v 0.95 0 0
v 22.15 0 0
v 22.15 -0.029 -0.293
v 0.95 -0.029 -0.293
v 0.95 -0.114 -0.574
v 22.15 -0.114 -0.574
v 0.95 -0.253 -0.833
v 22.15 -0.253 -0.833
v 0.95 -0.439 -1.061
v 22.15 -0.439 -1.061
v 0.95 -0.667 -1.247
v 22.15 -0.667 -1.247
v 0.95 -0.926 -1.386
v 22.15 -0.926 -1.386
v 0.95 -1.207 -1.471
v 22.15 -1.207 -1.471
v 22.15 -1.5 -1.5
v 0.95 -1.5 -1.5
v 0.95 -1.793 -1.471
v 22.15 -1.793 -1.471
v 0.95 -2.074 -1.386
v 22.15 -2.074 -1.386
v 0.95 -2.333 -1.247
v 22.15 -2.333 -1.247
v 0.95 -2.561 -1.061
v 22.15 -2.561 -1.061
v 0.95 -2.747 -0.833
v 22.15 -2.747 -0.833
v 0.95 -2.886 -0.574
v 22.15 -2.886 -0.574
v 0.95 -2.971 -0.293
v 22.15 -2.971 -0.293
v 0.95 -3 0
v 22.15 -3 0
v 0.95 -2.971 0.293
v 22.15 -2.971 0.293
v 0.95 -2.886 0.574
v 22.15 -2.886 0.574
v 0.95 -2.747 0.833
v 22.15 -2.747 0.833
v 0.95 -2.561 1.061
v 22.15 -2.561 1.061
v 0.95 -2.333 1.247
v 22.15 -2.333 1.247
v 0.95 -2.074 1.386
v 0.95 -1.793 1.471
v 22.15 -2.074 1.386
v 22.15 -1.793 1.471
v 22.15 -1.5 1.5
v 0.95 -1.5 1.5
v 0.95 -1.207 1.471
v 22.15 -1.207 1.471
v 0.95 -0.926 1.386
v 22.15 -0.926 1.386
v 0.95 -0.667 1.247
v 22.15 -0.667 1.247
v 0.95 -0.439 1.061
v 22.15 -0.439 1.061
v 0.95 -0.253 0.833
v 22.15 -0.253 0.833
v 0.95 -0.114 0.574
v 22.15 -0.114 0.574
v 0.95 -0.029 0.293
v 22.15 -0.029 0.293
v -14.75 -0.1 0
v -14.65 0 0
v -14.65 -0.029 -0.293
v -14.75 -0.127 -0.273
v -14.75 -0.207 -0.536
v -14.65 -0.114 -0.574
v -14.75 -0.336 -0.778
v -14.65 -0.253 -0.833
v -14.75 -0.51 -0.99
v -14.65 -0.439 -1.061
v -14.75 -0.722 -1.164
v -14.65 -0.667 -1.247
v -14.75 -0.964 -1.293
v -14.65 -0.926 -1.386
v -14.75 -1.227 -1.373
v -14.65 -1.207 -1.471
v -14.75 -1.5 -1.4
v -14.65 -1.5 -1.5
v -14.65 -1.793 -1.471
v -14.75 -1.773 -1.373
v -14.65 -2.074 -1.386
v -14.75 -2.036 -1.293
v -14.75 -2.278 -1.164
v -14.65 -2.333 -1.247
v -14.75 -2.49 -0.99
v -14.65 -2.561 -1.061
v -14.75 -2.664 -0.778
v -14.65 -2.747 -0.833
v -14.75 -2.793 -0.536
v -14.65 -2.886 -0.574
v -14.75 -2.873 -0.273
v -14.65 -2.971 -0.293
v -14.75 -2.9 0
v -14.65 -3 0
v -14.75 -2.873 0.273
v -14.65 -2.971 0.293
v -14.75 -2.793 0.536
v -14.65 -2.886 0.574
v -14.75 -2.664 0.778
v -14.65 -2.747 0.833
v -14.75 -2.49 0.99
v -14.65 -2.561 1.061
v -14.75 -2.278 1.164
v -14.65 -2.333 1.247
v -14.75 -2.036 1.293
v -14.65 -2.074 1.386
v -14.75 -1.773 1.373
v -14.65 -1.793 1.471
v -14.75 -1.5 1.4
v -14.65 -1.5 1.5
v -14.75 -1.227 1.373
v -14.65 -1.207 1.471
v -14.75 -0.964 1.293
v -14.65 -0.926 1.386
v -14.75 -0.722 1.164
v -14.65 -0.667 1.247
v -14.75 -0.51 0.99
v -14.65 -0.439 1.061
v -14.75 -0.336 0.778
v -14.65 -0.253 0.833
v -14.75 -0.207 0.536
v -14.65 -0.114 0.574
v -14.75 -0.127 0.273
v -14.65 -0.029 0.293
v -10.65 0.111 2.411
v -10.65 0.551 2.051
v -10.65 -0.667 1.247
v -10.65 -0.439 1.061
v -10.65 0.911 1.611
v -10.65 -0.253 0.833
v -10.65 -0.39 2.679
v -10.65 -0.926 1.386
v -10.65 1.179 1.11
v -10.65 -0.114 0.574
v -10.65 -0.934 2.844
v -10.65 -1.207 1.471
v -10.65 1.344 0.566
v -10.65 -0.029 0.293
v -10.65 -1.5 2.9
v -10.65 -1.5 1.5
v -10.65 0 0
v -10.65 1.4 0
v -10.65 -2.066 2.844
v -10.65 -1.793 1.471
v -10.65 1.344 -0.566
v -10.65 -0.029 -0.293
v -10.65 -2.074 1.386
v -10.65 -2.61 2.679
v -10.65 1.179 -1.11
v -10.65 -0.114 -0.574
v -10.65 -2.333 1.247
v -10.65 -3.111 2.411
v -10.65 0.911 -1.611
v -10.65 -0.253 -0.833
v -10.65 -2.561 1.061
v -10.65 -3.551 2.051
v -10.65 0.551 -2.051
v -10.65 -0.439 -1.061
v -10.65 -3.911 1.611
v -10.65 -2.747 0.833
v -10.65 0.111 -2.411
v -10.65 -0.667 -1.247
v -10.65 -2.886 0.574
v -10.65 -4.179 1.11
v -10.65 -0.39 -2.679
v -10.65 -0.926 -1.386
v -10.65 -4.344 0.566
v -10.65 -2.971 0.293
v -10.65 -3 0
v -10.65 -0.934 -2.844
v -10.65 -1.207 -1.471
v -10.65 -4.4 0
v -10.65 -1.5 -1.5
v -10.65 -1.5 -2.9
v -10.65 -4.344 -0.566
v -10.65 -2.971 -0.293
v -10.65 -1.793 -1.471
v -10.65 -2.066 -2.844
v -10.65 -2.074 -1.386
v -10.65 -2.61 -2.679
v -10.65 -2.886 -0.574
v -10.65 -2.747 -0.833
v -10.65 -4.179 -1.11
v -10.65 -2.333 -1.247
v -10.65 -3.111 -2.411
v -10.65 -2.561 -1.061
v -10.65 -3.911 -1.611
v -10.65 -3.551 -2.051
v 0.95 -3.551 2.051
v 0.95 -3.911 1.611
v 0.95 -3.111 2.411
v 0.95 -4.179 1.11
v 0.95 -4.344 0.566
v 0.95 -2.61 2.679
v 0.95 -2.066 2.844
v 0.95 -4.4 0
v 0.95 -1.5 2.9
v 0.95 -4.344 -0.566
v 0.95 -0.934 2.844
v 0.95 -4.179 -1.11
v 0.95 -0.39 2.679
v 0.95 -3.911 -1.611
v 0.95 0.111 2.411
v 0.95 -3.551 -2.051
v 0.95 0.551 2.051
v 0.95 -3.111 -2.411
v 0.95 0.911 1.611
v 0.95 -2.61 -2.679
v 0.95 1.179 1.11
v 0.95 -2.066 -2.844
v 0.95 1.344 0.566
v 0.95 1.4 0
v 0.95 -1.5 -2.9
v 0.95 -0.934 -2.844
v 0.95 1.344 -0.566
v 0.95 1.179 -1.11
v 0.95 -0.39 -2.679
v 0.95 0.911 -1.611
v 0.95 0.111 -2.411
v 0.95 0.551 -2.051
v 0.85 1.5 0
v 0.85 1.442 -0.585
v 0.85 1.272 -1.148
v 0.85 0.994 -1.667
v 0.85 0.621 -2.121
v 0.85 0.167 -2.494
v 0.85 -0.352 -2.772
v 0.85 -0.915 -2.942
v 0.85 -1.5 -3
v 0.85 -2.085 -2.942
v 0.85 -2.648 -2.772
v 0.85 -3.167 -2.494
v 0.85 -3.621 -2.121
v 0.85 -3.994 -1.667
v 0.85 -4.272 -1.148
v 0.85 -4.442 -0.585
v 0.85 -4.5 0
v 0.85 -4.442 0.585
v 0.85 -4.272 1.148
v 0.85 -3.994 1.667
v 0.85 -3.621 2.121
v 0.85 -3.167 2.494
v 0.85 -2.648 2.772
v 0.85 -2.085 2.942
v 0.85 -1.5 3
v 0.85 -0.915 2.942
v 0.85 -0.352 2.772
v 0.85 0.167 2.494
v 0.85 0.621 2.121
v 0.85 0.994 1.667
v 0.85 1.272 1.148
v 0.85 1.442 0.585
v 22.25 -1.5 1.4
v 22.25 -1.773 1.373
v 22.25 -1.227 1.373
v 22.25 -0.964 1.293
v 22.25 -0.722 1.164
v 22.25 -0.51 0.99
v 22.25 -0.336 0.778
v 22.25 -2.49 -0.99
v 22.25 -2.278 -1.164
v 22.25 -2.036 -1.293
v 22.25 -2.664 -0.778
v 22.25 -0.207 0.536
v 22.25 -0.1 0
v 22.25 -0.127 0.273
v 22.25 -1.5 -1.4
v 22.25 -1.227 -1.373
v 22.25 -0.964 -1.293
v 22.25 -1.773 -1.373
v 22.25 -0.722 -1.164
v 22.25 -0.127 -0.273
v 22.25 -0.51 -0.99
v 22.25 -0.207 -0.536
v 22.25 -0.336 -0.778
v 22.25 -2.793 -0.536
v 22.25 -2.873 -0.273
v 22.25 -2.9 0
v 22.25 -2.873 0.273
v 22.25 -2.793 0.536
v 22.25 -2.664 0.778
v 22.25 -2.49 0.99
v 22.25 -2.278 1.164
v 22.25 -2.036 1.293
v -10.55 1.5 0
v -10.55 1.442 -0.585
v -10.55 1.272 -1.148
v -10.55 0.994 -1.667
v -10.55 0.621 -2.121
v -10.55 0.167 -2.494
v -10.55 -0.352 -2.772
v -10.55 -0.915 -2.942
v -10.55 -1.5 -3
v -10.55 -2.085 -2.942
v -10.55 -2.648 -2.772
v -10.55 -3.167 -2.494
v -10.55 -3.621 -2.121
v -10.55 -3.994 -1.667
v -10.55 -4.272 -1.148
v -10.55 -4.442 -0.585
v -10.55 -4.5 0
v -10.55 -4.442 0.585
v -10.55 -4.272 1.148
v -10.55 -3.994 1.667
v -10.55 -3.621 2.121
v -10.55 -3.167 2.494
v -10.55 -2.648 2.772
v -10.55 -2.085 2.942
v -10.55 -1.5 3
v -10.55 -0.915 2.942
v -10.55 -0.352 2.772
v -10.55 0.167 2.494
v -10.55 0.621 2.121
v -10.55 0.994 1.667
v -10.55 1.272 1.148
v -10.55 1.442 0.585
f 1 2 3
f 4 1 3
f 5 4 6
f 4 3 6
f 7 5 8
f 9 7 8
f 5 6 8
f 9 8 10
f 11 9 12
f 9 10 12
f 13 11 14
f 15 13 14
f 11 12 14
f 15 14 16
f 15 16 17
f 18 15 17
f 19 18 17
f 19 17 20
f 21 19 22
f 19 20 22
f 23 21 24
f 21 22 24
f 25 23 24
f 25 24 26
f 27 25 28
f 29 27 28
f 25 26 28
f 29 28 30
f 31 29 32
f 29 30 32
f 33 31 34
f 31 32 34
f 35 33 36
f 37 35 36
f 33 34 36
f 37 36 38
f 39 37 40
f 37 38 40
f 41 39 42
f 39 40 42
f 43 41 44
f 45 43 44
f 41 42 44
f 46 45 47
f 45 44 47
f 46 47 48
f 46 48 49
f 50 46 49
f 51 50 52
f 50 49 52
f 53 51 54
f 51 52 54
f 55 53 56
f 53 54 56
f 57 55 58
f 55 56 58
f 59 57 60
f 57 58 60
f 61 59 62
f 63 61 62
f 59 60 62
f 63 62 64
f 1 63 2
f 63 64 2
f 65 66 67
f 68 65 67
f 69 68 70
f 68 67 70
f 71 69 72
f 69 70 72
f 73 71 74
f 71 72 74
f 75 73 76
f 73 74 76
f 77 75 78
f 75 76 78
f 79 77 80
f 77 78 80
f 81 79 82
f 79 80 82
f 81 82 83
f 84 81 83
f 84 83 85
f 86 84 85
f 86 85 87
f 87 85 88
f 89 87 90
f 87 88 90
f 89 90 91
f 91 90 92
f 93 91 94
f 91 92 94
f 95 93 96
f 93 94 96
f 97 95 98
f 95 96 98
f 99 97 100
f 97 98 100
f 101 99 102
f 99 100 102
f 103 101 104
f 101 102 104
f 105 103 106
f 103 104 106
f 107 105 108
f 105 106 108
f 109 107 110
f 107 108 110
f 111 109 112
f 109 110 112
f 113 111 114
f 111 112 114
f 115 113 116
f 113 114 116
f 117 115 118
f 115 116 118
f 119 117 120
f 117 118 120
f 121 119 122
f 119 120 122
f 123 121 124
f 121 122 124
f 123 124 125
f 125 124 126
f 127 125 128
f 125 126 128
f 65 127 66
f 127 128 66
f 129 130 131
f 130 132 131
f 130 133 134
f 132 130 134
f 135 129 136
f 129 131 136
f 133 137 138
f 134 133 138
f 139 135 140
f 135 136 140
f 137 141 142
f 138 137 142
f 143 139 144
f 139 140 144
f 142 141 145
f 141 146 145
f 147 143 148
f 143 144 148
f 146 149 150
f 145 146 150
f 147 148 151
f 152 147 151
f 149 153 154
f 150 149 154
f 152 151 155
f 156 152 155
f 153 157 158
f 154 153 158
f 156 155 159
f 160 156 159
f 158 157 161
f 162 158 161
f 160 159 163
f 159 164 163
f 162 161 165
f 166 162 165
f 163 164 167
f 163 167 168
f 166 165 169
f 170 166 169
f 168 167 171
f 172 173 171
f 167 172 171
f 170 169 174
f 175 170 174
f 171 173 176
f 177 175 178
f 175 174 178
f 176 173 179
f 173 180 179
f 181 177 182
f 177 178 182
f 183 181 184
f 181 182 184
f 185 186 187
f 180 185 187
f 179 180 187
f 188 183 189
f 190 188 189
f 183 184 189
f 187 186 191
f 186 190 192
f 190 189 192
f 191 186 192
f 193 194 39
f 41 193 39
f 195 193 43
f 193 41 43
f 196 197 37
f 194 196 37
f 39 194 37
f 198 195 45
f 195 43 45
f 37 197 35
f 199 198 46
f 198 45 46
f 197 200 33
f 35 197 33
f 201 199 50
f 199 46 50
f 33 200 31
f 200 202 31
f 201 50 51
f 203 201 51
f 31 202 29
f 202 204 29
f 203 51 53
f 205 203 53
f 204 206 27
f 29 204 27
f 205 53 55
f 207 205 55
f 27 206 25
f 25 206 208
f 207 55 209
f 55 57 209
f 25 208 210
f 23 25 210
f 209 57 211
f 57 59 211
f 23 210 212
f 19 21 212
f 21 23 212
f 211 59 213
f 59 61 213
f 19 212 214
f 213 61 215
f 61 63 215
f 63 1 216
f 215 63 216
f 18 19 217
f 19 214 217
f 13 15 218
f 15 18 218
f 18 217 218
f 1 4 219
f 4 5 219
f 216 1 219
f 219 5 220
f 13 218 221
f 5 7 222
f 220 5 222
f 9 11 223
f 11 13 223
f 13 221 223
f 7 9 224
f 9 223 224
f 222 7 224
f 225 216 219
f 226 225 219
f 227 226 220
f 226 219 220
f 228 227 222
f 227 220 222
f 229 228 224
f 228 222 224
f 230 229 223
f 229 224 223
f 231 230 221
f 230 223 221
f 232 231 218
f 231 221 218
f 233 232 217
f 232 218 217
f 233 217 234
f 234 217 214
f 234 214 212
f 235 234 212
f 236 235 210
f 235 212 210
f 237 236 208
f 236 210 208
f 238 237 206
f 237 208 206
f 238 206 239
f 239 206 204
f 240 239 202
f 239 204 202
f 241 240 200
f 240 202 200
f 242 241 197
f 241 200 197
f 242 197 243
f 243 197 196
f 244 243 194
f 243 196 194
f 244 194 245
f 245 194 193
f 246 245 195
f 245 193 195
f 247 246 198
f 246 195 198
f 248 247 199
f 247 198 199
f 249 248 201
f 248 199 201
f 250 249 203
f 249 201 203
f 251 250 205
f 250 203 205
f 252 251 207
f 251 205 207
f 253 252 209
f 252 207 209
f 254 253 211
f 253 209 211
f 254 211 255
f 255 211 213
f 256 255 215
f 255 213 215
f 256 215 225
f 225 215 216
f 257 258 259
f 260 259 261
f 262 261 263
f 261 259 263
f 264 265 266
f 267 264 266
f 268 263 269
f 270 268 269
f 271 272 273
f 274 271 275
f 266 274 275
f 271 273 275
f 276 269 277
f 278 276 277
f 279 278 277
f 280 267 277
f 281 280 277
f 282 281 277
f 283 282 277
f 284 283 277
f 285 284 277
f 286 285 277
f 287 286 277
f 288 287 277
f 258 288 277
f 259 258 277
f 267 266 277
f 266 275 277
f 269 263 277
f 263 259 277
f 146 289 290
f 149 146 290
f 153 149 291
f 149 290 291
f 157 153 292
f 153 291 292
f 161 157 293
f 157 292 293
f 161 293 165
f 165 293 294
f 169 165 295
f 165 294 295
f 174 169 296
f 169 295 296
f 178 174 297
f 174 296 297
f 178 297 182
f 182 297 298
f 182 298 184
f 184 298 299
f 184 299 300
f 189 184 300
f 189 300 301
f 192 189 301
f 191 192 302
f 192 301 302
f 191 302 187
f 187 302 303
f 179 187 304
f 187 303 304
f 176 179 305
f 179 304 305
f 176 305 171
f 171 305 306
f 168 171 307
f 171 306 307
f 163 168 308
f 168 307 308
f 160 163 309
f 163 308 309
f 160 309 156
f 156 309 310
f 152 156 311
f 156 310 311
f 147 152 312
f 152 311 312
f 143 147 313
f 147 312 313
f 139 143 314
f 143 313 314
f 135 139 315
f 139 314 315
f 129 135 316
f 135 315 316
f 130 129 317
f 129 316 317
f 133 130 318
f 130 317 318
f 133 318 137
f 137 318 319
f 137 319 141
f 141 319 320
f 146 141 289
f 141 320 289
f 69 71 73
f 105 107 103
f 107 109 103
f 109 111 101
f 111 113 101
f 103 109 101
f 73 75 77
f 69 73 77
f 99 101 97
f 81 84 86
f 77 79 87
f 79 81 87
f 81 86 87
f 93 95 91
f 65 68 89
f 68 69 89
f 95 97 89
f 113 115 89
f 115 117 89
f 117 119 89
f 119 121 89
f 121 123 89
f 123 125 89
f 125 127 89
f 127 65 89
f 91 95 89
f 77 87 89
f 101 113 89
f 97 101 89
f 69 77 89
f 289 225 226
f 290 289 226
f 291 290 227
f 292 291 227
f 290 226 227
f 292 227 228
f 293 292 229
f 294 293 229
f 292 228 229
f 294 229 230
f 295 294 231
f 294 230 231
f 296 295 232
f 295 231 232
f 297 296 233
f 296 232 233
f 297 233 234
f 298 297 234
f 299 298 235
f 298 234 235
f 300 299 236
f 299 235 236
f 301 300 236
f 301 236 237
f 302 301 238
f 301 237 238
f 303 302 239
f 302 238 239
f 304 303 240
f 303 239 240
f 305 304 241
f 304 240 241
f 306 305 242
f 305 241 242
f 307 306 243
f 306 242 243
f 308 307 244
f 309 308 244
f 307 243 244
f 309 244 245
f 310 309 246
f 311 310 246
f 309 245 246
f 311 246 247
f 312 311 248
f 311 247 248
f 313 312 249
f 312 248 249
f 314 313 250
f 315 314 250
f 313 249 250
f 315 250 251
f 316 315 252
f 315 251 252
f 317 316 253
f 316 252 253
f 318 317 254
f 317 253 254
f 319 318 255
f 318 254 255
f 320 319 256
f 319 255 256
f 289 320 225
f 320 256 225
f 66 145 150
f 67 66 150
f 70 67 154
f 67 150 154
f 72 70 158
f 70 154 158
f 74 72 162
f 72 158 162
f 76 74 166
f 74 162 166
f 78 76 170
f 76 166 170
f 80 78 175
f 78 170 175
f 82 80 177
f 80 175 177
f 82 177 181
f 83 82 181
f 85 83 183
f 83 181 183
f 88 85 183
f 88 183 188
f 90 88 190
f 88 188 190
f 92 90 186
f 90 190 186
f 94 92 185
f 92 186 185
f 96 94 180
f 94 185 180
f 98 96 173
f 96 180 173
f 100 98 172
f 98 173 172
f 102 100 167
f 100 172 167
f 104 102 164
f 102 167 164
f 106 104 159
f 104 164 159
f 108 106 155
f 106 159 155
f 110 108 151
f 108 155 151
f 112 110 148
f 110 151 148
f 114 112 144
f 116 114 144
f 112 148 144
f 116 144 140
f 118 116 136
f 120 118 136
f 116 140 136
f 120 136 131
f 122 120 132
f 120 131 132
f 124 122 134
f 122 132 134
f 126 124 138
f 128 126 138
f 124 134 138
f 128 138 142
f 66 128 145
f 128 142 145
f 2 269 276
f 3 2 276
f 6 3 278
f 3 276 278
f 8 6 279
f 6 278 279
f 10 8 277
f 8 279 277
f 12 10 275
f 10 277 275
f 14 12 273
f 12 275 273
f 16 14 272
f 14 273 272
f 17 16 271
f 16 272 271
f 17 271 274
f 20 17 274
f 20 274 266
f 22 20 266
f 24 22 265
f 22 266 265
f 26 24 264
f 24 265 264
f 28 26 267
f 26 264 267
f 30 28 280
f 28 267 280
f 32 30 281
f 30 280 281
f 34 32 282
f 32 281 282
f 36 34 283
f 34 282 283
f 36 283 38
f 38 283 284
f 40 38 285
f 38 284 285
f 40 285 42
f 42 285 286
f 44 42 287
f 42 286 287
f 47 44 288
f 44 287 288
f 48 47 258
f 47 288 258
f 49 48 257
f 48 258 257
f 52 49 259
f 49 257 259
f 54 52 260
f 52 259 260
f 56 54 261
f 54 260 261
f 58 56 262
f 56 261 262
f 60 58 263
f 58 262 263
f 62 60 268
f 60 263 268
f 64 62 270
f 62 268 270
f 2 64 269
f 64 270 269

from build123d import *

# Parameters (mm, degrees)
CHAMFER3_SIZE = 0.1
CHAMFER4_SIZE = 0.1
CHAMFER5_SIZE = 0.1
CHAMFER6_SIZE = 0.1


with BuildPart() as part:
    # Sketch1 → Revolve2 (revolve)
    with BuildSketch(Plane.XY):
        Polygon((-10.65, 1.5), (0.95, 1.5), (0.95, 0), (22.25, 0), (22.25, -1.5), (0.95, -1.5), (-10.65, -1.5), (-14.75, -1.5), (-14.75, 0), (-10.65, 0), align=None)
    revolve(axis=Axis((-10.65, -1.5, 0), (-1, 0, 0)))

    # Chamfer3
    chamfer3_edges = [part.edges().sort_by_distance(p)[0] for p in [
        (-14.75, -3, 0),
    ]]
    chamfer(chamfer3_edges, length=CHAMFER3_SIZE)

    # Chamfer4
    chamfer4_edges = [part.edges().sort_by_distance(p)[0] for p in [
        (-10.65, -4.5, 0),
    ]]
    chamfer(chamfer4_edges, length=CHAMFER4_SIZE)

    # Chamfer5
    chamfer5_edges = [part.edges().sort_by_distance(p)[0] for p in [
        (0.95, -4.5, 0),
    ]]
    chamfer(chamfer5_edges, length=CHAMFER5_SIZE)

    # Chamfer6
    chamfer6_edges = [part.edges().sort_by_distance(p)[0] for p in [
        (22.25, -3, 0),
    ]]
    chamfer(chamfer6_edges, length=CHAMFER6_SIZE)


solid = part.part
